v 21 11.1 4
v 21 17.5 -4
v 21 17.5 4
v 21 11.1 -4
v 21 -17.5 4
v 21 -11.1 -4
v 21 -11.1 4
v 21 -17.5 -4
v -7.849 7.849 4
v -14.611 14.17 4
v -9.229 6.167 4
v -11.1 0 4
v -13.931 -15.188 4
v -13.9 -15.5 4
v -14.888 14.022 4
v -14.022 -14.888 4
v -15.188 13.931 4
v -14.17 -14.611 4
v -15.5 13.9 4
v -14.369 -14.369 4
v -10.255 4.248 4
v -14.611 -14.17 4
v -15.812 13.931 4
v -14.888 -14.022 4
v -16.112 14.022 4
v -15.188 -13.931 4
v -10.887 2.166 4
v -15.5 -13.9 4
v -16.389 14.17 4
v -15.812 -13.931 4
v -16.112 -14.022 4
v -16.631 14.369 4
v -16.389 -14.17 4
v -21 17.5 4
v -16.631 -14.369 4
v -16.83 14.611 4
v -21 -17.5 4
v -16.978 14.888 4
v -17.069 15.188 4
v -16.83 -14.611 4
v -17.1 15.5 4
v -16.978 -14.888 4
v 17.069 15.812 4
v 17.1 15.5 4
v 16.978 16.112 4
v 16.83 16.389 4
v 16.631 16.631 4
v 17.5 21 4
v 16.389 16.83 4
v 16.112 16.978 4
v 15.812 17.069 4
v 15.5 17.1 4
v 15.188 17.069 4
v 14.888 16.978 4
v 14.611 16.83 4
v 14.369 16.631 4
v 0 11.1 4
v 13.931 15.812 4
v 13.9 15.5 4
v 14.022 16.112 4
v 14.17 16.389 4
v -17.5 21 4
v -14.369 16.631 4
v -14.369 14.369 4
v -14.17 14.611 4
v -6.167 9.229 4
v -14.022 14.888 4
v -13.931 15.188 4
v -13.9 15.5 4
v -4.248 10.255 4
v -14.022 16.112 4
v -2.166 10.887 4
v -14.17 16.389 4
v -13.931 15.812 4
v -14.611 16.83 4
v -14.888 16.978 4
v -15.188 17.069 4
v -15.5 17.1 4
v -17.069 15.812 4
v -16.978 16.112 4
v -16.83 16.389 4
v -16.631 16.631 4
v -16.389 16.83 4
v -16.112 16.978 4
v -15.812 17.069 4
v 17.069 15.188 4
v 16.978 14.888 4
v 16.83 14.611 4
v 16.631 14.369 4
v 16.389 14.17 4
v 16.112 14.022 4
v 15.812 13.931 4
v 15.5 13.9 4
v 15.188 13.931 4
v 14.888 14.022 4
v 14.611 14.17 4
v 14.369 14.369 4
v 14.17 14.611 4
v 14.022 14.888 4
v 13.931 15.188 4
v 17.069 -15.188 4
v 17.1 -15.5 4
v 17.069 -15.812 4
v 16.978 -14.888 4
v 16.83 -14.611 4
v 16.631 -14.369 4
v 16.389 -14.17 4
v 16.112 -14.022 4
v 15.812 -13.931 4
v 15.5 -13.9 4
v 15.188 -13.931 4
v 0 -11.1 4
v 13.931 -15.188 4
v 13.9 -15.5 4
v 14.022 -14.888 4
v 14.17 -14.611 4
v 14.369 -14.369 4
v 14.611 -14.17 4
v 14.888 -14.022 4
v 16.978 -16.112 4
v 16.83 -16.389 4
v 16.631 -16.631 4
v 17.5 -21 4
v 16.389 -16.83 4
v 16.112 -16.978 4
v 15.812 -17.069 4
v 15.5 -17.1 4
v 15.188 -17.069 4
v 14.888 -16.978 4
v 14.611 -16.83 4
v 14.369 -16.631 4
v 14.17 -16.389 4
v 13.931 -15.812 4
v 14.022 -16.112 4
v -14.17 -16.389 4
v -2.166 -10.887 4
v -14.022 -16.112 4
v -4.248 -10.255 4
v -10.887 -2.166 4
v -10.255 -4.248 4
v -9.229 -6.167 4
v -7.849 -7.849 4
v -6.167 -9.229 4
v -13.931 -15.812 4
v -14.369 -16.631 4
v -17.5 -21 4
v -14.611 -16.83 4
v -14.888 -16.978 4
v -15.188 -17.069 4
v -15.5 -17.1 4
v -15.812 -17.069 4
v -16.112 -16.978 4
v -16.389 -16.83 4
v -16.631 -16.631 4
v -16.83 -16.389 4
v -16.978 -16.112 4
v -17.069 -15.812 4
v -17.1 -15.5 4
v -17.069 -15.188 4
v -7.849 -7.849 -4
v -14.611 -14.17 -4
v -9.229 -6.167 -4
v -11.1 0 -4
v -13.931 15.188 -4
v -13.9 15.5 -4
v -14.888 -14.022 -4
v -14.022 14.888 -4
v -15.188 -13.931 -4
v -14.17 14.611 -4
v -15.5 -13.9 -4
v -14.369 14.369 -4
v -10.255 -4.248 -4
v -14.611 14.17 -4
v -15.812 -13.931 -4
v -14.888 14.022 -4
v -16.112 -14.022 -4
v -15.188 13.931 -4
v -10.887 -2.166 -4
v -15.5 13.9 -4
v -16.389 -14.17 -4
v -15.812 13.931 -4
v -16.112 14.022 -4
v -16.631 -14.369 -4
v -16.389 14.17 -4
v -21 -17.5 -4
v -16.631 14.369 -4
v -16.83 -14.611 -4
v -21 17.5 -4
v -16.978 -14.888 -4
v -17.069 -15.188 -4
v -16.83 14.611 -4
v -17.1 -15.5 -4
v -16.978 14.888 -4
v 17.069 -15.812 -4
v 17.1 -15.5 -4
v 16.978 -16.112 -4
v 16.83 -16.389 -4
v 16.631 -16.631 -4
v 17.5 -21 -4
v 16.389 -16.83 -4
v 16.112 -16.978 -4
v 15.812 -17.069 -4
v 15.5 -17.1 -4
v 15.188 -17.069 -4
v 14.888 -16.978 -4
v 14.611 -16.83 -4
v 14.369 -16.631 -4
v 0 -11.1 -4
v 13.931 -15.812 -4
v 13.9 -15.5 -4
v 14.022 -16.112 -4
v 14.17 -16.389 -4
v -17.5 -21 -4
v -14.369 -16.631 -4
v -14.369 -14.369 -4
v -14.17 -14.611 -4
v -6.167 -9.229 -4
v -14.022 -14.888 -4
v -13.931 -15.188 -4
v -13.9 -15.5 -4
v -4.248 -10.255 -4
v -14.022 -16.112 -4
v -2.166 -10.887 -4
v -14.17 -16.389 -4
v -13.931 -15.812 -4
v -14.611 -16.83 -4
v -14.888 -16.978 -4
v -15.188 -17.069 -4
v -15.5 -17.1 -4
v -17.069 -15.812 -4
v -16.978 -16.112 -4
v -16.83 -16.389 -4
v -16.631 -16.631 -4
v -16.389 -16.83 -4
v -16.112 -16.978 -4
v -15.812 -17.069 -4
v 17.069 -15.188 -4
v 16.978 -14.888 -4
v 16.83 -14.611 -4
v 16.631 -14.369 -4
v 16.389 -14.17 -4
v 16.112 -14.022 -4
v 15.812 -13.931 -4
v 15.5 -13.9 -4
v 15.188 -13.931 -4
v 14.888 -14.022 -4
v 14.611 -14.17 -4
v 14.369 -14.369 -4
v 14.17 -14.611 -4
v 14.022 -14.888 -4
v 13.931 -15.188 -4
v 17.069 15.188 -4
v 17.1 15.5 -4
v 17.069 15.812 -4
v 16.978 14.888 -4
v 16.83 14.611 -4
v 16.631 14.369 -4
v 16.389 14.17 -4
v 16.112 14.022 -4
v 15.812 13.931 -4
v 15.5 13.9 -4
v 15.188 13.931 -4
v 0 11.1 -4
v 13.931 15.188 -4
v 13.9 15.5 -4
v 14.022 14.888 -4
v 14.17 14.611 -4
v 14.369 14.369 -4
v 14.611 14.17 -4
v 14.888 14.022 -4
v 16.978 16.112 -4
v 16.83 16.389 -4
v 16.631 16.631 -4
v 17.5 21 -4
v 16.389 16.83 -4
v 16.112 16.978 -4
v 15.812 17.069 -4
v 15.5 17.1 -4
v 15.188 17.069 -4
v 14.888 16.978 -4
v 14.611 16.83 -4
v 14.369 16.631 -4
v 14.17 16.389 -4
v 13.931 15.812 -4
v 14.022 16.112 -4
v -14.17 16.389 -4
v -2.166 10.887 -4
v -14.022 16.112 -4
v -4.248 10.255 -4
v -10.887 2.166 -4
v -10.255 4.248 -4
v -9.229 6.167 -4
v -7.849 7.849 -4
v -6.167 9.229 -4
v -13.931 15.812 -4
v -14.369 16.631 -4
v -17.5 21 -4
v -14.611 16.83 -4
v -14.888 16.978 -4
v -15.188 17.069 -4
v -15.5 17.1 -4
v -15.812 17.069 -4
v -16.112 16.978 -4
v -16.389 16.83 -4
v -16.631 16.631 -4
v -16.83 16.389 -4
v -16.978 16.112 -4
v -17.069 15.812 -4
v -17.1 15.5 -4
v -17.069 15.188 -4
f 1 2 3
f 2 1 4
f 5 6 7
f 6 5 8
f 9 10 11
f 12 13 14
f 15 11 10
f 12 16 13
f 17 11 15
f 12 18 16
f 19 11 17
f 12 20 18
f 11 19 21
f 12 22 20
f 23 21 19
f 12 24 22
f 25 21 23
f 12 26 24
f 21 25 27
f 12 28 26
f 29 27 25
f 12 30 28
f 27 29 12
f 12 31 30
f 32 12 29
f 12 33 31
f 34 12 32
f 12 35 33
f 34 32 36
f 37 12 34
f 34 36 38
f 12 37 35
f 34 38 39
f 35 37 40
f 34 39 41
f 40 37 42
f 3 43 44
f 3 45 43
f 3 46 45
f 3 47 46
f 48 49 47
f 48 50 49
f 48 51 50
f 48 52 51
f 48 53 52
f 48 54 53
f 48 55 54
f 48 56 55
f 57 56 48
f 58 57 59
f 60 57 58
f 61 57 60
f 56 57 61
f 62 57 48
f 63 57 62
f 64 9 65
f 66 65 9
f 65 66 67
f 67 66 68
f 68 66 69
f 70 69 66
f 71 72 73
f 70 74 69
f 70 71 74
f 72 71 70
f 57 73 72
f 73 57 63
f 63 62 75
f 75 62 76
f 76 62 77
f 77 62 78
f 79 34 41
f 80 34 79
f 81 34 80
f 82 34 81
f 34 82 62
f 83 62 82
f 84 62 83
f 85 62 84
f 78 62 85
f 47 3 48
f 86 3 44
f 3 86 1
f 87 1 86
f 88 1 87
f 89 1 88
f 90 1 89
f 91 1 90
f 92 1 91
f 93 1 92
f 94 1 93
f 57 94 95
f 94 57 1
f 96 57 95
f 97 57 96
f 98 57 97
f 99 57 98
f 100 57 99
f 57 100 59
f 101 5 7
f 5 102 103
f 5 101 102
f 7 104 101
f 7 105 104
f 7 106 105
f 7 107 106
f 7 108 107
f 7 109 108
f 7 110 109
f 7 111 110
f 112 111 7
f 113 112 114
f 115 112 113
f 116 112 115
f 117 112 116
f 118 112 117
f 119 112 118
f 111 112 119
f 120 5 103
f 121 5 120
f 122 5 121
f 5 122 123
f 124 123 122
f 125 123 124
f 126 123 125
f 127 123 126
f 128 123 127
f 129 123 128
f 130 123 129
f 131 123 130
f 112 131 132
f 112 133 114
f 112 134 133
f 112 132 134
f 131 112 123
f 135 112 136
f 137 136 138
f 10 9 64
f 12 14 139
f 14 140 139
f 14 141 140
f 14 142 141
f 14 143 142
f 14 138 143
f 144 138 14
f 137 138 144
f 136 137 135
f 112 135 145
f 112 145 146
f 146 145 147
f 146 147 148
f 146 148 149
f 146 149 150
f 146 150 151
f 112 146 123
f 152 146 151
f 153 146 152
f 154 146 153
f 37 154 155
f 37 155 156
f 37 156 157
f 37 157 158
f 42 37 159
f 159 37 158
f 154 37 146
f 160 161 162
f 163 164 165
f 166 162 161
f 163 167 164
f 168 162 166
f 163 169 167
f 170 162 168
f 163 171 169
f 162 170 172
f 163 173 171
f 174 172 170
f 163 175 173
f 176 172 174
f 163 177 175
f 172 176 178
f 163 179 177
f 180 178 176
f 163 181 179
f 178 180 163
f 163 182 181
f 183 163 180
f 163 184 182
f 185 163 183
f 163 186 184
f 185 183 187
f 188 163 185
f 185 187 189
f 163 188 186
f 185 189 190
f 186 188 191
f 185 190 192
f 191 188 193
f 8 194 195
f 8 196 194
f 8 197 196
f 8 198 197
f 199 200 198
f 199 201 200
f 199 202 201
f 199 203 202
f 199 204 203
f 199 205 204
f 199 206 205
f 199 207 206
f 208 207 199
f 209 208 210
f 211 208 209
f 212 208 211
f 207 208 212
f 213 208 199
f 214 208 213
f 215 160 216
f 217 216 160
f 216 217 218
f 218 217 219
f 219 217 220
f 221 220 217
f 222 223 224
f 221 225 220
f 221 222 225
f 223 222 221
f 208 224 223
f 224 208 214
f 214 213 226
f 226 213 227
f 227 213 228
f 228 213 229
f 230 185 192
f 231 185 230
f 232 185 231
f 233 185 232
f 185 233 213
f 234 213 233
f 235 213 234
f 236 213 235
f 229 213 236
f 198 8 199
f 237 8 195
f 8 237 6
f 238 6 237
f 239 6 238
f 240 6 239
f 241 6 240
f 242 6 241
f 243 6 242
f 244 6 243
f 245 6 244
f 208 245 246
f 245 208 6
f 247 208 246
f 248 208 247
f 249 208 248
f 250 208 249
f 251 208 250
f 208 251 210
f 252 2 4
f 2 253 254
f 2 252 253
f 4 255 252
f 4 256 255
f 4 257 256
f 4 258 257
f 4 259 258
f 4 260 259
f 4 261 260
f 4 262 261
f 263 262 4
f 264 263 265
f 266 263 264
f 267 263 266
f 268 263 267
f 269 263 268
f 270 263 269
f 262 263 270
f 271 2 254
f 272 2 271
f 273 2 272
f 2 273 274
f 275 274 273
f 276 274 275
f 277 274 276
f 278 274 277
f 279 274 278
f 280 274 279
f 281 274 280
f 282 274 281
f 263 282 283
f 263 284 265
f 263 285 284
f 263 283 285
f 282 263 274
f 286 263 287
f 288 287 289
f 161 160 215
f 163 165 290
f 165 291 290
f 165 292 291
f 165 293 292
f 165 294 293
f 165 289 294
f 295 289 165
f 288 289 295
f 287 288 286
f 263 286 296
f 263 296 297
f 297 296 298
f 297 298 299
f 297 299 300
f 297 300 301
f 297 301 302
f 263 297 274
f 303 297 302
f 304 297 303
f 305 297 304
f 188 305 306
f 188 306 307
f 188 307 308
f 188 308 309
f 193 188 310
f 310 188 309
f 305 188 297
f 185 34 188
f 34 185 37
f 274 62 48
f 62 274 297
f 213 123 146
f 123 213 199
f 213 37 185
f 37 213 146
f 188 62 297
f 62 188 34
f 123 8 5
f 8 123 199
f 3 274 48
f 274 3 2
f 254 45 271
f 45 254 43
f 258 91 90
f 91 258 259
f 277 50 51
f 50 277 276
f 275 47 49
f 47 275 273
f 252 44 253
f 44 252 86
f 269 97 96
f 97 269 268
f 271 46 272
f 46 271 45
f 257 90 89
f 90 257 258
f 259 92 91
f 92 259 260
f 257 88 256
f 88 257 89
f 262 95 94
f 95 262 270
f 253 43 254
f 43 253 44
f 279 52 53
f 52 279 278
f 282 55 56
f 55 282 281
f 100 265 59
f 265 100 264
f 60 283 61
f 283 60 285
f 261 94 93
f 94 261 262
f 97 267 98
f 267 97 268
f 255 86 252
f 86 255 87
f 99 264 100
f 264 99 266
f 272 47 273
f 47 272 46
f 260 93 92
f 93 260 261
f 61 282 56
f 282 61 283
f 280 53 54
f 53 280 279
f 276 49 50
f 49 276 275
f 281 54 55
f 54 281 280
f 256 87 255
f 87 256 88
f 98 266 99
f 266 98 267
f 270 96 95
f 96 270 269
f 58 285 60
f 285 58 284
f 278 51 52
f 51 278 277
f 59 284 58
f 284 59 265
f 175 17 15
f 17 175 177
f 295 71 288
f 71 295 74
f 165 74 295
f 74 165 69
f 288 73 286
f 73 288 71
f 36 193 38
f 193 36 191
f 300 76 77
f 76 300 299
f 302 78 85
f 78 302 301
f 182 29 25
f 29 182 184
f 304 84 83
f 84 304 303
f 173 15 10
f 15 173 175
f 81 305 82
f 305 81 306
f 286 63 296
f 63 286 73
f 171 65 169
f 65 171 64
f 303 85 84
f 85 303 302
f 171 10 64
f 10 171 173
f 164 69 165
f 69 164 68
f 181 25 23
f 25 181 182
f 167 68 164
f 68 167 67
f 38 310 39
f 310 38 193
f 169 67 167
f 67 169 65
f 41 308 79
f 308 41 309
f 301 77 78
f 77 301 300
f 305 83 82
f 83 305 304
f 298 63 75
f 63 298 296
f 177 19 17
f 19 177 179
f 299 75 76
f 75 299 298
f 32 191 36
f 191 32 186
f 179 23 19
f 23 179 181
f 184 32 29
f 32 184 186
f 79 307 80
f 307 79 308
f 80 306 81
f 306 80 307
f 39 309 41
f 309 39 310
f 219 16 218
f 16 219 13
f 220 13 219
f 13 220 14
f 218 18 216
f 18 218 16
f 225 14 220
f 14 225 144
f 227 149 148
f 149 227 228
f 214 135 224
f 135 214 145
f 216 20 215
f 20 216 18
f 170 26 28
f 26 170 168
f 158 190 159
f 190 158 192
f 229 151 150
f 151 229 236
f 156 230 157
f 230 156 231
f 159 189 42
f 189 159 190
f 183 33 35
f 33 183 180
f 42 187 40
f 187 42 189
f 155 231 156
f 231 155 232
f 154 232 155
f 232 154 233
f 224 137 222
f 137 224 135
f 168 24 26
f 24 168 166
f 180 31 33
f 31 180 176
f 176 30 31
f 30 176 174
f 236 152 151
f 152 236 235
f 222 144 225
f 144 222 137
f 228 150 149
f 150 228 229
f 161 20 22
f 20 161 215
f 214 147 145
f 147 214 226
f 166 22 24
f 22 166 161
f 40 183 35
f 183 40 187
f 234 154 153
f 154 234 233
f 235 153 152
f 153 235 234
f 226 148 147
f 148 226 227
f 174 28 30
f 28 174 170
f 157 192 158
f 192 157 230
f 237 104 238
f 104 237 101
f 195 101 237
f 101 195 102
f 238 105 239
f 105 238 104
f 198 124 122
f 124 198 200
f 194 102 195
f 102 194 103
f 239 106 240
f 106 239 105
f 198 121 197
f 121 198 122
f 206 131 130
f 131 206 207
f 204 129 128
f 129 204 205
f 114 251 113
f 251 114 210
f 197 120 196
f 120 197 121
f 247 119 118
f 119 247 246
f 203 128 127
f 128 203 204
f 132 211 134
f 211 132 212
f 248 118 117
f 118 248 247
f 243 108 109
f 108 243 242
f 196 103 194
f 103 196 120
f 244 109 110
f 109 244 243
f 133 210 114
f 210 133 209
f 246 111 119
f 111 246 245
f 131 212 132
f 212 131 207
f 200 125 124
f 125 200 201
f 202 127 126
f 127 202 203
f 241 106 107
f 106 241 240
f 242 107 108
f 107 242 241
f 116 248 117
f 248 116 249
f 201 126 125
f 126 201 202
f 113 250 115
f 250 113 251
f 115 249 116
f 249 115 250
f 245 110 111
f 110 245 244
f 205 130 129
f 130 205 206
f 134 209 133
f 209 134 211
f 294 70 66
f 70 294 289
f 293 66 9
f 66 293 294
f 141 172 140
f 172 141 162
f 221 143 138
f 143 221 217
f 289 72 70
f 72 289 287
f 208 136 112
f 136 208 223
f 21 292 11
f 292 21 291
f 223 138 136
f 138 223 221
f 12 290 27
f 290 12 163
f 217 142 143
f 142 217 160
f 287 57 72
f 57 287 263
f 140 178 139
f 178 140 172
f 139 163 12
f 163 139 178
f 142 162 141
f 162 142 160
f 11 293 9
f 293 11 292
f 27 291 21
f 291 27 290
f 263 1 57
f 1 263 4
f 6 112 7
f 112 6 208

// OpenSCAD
// Thickness of the spacer in mm
thickness = 8; //[2:20]

// Motor size in mm (NEMA17=42, NEMA23=56)
motor_size = 42; //[42,56]

// Bolt size (NEMA17=3, NEMA23=5)
thread = 3; //[3,5]

// Size of the center cutout in mm (NEMA17=22, NEMA23=38.1)
spindle_mount = 22; //[22,38.1]

// Does the spacer need a slot?
slot = "Yes"; //[Yes,No]

// Extra clearance around center hole and bolt holes in mm (Set based on your printer's tolerances)
tolerance = 0.1; //[0:0.05:0.3]

/* {Hidden] */
chamf_cube = (((motor_size/2)/(cos(45)))-((3.5)*(cos(45))))*2;
$fn=32;

difference(){
  intersection(){
    cube([motor_size, motor_size, thickness], true);
    rotate([0,0,45]){
      cube([chamf_cube, chamf_cube, thickness], true);
    }
  }
  cylinder(d=spindle_mount+(tolerance*2), h=thickness, center=true);
  if (slot == "Yes") {
    translate([(spindle_mount/2)+tolerance, 0, 0]){
      cube([spindle_mount+(tolerance*2), spindle_mount+(tolerance*2), thickness], true);
    }
  }
  if (motor_size == 42){
    translate([15.5,15.5,0]){
      cylinder(d=thread+(tolerance*2), h=thickness, center=true);
    }
    translate([-15.5,15.5,0]){
      cylinder(d=thread+(tolerance*2), h=thickness, center=true);
    }
    translate([-15.5,-15.5,0]){
      cylinder(d=thread+(tolerance*2), h=thickness, center=true);
    }
    translate([15.5,-15.5,0]){
      cylinder(d=thread+(tolerance*2), h=thickness, center=true);
    }
  } else {
    translate([23.57,23.57,0]){
      cylinder(d=thread+(tolerance*2), h=thickness, center=true);
    }
    translate([-23.57,23.57,0]){
      cylinder(d=thread+(tolerance*2), h=thickness, center=true);
    }
    translate([-23.57,-23.57,0]){
      cylinder(d=thread+(tolerance*2), h=thickness, center=true);
    }
    translate([23.57,-23.57,0]){
      cylinder(d=thread+(tolerance*2), h=thickness, center=true);
    }
  }
}
